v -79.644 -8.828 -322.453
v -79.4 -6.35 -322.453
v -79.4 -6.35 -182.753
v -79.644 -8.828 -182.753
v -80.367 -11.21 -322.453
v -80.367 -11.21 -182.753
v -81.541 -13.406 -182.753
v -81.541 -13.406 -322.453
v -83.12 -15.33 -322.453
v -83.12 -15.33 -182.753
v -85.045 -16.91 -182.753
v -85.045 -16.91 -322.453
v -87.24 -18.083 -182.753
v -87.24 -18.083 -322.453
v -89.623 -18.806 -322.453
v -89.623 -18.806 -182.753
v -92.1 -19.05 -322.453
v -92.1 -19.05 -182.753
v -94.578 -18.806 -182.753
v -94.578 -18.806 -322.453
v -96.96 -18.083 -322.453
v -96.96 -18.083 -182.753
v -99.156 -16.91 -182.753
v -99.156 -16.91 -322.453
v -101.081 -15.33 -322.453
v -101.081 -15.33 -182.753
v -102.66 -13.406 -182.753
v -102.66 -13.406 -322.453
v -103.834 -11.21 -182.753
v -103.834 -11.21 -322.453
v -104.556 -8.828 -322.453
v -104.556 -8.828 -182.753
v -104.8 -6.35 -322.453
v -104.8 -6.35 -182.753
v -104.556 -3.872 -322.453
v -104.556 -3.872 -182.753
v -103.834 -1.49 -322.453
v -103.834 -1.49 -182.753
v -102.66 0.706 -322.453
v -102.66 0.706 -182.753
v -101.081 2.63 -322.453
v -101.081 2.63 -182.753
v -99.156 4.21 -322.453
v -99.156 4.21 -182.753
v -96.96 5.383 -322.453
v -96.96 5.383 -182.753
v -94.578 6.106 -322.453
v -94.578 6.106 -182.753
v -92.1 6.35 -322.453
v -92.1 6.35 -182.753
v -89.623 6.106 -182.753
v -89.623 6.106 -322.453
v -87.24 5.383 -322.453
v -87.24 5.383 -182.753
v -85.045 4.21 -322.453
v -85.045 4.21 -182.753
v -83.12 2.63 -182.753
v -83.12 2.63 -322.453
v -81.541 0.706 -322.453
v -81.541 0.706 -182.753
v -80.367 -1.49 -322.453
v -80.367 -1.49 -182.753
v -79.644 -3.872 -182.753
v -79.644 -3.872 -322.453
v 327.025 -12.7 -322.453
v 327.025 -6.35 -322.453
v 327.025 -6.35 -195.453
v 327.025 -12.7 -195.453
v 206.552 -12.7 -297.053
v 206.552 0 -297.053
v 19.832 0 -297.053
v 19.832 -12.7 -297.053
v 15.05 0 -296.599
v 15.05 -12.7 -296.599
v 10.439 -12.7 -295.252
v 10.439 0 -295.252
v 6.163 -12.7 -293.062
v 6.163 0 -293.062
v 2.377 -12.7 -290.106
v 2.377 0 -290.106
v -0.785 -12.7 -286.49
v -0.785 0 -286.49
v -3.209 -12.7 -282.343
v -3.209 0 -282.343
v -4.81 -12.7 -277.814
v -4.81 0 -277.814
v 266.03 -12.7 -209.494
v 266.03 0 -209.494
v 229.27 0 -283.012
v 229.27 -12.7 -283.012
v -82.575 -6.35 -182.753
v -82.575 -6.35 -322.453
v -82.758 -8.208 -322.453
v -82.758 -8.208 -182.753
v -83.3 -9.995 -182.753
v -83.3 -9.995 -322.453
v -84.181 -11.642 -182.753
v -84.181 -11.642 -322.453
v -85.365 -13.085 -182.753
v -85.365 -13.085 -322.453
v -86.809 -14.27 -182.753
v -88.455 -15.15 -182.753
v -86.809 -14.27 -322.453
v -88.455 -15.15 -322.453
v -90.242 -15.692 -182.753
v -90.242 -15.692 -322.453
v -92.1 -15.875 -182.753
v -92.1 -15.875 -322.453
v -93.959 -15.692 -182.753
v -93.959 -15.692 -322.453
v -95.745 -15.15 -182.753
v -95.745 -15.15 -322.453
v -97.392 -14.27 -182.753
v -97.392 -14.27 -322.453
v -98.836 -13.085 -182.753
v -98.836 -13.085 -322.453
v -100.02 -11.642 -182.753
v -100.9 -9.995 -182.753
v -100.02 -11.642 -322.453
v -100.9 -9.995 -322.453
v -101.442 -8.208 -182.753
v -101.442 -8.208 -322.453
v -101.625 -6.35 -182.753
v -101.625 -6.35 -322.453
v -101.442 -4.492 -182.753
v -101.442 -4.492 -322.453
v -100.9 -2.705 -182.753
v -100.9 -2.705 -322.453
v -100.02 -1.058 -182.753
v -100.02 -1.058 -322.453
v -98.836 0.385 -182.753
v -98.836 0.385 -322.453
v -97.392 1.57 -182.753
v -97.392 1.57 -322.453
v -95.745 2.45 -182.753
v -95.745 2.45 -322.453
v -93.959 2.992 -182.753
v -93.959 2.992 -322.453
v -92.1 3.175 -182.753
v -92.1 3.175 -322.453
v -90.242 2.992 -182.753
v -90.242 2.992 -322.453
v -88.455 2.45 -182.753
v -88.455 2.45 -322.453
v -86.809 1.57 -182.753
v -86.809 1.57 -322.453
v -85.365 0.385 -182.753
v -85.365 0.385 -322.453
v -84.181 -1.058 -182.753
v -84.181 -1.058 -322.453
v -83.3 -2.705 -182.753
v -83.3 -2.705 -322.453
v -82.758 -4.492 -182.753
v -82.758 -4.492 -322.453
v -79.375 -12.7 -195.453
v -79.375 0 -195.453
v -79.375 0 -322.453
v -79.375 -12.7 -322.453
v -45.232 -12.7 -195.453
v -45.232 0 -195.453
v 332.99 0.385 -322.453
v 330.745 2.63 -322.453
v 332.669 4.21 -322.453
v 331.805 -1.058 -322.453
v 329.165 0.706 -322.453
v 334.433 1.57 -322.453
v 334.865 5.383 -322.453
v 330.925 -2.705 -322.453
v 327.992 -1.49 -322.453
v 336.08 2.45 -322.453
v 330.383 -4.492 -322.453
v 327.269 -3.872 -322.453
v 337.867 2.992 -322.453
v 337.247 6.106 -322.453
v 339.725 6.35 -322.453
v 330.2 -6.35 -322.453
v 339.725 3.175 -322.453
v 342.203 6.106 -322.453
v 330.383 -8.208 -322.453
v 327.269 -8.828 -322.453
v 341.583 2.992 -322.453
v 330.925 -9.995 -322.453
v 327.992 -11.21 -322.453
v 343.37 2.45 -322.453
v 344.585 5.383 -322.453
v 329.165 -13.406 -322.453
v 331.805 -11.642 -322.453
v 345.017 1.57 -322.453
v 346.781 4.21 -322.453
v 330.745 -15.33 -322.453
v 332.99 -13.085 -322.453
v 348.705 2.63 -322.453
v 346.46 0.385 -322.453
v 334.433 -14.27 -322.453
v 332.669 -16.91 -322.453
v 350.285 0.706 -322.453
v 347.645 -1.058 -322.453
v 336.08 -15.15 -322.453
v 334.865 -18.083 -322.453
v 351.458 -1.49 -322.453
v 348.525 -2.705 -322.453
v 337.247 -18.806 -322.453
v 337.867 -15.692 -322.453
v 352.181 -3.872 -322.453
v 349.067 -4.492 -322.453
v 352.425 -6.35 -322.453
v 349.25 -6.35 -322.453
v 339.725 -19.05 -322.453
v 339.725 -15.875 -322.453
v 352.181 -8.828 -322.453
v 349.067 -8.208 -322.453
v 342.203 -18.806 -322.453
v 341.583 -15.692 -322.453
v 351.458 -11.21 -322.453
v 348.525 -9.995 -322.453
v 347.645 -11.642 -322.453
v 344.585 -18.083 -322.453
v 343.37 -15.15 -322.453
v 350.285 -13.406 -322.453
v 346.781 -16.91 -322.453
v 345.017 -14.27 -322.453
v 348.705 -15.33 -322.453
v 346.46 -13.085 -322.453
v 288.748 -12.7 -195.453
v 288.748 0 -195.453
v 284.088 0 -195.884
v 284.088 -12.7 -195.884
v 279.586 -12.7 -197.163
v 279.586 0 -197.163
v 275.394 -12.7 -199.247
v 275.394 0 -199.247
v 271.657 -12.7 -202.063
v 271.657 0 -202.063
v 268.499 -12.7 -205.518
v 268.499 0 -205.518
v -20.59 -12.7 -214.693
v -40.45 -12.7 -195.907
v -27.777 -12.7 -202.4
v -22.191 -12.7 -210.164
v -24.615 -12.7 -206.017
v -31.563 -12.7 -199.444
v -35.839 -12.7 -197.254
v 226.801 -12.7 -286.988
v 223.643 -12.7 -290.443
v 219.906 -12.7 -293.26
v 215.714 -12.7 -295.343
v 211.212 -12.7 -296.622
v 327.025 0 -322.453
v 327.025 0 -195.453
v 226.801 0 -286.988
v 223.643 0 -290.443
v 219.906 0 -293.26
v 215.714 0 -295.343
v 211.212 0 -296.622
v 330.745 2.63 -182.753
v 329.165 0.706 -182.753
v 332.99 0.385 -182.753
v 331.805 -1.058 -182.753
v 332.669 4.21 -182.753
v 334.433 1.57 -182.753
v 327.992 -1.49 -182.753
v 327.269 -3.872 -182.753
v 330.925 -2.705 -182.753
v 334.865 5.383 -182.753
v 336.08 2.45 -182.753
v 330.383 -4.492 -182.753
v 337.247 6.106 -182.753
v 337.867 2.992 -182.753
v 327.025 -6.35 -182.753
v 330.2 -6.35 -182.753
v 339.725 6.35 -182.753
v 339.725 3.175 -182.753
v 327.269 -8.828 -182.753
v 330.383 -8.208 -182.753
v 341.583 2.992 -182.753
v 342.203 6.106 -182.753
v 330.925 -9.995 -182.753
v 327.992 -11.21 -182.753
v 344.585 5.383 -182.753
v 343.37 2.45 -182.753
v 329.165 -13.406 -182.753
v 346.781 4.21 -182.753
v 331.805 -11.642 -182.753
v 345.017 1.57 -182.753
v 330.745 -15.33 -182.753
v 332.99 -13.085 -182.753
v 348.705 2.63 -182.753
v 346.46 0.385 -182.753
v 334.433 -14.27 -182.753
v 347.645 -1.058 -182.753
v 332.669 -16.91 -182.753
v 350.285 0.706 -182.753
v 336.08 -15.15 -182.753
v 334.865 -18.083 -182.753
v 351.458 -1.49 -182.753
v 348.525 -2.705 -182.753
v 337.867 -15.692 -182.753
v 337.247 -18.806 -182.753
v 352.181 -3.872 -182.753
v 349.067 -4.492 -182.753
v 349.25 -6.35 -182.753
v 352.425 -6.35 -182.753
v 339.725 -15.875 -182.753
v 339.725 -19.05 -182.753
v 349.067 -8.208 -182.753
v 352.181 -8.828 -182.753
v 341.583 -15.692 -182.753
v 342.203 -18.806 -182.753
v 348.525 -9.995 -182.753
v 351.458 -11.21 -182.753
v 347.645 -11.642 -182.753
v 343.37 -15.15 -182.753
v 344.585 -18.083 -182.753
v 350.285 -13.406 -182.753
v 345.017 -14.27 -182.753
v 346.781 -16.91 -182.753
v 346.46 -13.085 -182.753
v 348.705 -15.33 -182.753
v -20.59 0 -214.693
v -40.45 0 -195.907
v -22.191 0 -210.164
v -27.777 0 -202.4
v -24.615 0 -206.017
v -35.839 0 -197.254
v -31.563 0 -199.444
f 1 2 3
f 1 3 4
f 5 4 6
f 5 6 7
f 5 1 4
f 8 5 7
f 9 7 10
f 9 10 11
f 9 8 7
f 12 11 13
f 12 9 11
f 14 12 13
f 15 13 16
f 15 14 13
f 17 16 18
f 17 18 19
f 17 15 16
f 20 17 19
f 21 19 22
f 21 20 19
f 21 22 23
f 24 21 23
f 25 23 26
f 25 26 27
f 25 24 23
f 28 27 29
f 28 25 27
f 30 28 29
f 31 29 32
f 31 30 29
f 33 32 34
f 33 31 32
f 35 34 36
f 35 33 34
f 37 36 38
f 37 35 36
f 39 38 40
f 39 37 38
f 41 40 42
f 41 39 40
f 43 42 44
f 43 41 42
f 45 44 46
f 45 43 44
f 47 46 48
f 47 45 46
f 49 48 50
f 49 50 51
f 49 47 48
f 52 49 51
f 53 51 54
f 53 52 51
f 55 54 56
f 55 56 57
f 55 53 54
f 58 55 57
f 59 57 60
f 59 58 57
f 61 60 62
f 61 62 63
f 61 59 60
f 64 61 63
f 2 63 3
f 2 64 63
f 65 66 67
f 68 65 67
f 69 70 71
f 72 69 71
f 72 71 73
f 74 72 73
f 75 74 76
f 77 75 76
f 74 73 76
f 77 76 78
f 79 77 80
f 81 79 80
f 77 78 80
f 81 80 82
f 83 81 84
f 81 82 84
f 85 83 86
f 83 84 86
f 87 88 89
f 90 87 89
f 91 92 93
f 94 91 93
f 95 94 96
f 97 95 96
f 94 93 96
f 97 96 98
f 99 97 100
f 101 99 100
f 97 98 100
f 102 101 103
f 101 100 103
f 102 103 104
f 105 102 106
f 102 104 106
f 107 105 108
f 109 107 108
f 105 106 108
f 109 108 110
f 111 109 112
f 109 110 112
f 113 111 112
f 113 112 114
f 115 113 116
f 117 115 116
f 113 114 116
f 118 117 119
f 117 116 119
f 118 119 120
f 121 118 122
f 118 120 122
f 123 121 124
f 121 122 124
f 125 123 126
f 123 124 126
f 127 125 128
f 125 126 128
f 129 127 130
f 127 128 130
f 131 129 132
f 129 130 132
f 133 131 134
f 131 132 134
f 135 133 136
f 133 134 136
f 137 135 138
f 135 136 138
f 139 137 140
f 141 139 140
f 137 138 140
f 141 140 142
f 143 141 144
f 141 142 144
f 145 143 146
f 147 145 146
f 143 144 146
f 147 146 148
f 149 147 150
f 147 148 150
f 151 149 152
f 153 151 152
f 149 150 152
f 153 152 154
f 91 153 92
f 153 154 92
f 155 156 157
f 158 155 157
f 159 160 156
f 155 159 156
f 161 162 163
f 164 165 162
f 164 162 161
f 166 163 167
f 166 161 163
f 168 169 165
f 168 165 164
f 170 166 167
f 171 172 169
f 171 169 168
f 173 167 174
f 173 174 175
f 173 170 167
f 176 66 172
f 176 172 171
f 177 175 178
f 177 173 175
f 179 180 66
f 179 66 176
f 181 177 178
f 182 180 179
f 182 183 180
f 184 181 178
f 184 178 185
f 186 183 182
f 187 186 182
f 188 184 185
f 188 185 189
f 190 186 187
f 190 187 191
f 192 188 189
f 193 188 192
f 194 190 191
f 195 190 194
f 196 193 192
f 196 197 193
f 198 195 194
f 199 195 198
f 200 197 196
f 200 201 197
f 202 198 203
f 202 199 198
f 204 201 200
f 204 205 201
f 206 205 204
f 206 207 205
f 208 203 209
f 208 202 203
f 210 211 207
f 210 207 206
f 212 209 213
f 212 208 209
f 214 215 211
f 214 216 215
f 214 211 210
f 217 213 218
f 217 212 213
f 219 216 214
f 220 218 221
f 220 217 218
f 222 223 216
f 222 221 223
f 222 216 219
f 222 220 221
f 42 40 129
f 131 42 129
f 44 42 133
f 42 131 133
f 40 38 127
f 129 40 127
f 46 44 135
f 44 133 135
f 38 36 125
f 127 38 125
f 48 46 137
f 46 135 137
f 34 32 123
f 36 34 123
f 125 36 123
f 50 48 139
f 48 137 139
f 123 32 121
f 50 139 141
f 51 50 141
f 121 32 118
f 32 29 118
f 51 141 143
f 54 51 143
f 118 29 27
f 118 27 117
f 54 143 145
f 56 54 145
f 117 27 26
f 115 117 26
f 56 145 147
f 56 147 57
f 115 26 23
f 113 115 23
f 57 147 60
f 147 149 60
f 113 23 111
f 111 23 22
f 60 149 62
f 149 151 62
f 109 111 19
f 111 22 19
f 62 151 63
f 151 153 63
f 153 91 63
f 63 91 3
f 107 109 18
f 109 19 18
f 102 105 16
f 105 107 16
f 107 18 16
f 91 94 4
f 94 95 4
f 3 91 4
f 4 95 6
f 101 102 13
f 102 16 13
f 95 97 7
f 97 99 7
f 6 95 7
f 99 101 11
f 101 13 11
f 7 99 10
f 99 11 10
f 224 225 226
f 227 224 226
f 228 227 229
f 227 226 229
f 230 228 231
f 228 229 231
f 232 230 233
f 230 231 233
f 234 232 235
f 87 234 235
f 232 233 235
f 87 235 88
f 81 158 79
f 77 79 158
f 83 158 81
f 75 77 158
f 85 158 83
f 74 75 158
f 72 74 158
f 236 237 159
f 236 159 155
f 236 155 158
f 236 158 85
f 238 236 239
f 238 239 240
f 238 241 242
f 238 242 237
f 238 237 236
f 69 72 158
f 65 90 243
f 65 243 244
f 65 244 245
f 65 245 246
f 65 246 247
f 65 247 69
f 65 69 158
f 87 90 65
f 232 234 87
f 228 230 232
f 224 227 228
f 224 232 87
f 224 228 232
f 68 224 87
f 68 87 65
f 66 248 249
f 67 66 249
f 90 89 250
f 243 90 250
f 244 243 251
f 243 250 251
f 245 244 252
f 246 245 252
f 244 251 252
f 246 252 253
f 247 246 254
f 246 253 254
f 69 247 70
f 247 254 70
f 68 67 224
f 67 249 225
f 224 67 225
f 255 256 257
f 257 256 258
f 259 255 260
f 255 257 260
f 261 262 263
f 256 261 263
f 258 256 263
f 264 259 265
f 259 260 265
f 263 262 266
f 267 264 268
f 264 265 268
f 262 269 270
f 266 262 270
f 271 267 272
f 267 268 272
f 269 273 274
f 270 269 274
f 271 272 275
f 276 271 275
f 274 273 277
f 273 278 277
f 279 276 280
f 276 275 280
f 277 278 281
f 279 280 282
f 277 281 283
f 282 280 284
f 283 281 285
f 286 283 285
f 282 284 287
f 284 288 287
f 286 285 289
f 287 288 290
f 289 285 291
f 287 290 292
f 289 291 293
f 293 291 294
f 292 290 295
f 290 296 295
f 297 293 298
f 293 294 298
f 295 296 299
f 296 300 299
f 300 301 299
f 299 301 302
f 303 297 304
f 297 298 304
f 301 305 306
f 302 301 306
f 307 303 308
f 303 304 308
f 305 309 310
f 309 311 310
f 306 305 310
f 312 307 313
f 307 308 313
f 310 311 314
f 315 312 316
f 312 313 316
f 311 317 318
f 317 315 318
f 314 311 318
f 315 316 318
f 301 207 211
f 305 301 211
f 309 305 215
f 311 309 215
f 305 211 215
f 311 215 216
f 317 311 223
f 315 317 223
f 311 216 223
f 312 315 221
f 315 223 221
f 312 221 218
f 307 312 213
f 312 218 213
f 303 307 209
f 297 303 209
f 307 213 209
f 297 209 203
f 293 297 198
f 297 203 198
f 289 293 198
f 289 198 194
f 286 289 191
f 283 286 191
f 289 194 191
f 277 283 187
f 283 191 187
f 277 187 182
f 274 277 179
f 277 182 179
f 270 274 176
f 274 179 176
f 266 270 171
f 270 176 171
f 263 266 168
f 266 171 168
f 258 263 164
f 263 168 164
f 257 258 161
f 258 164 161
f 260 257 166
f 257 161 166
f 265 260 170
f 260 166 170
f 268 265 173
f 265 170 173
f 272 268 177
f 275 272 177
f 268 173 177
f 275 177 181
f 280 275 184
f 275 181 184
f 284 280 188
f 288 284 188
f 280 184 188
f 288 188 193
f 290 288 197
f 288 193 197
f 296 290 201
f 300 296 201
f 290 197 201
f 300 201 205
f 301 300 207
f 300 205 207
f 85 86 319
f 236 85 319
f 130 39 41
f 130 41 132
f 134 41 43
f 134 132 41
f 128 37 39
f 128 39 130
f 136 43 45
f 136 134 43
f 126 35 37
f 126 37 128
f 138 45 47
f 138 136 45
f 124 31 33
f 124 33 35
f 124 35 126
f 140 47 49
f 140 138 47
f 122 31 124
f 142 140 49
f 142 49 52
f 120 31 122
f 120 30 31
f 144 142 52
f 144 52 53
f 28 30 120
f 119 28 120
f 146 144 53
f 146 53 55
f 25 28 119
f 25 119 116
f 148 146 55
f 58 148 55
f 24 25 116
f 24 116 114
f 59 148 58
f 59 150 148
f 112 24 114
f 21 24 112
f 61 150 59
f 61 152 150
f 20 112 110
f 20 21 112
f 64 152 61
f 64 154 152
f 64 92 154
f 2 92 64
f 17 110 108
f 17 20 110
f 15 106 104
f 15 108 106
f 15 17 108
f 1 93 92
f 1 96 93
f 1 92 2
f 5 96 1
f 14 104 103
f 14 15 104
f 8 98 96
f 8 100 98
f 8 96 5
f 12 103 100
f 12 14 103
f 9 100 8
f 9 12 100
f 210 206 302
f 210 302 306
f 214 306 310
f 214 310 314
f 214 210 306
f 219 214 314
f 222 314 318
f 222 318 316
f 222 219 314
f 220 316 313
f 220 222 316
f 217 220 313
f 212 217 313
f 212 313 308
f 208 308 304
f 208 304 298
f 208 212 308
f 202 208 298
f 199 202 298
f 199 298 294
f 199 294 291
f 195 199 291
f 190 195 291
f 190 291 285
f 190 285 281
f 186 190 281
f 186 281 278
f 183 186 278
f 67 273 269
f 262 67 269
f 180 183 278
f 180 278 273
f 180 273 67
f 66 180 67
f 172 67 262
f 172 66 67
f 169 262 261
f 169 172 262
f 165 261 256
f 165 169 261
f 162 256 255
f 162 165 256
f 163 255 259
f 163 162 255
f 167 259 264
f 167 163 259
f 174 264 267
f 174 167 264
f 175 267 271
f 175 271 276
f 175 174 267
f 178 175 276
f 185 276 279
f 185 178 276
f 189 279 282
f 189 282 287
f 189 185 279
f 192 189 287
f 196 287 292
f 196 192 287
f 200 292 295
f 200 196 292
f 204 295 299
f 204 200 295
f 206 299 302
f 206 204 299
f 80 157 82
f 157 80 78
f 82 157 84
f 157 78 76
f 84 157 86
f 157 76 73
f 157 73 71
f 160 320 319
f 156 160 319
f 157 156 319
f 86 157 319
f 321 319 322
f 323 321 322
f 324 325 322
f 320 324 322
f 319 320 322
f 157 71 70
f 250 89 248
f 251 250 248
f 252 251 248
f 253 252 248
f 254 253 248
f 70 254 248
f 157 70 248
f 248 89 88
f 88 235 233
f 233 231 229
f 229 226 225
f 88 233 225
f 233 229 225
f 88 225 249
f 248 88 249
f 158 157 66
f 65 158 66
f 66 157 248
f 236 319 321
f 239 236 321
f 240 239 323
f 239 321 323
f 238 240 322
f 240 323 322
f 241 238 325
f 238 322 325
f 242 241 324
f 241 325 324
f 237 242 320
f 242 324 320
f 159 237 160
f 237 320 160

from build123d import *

# Parameters (mm, degrees)
F1_DEPTH = 12.7
F2_R     = 12.7
F2_R_2   = 9.525
F3_DEPTH = 139.7
F4_R     = 12.7
F4_R_2   = 9.525
F5_DEPTH = 139.7


with BuildPart() as f1:
    # F0 (on Front) → F1 (new body)
    with BuildSketch(Plane.XZ):
        with BuildLine():
            Line((206.551937, -297.053099), (19.831721, -297.053099))
            ThreePointArc((19.831721, -297.053099), (4.200251, -291.673517), (-4.809899, -277.813504))
            Line((-4.809899, -277.813504), (-20.590101, -214.692694))
            ThreePointArc((-20.590101, -214.692694), (-29.600251, -200.832681), (-45.231721, -195.453099))
            Line((-45.231721, -195.453099), (-79.375, -195.453099))
            Line((-79.375, -195.453099), (-79.375, -322.453099))
            Line((-79.375, -322.453099), (327.025, -322.453099))
            Line((327.025, -322.453099), (327.025, -195.453099))
            Line((327.025, -195.453099), (288.748063, -195.453099))
            ThreePointArc((288.748063, -195.453099), (275.394493, -199.246568), (266.029613, -209.493873))
            Line((266.029613, -209.493873), (229.270387, -283.012324))
            ThreePointArc((229.270387, -283.012324), (219.905507, -293.259629), (206.551937, -297.053099))
        make_face()
    extrude(amount=F1_DEPTH)

    # F2 (on face) → F3 (join)
    with BuildSketch(Plane(origin=(0, 0, -322.453099), x_dir=(1, 0, 0), z_dir=(0, 0, -1))):
        with Locations((339.725, 6.35)):
            Circle(F2_R)
        with Locations((339.725, 6.35)):
            Circle(F2_R_2, mode=Mode.SUBTRACT)
    extrude(amount=-F3_DEPTH)


with BuildPart() as f5:
    # F4 (on face) → F5 (new body)
    with BuildSketch(Plane(origin=(0, 0, -322.453099), x_dir=(1, 0, 0), z_dir=(0, 0, -1))):
        with Locations((-92.1004, 6.35)):
            Circle(F4_R)
        with Locations((-92.1004, 6.35)):
            Circle(F4_R_2, mode=Mode.SUBTRACT)
    extrude(amount=-F5_DEPTH)


solid = Compound([f1.part, f5.part])
